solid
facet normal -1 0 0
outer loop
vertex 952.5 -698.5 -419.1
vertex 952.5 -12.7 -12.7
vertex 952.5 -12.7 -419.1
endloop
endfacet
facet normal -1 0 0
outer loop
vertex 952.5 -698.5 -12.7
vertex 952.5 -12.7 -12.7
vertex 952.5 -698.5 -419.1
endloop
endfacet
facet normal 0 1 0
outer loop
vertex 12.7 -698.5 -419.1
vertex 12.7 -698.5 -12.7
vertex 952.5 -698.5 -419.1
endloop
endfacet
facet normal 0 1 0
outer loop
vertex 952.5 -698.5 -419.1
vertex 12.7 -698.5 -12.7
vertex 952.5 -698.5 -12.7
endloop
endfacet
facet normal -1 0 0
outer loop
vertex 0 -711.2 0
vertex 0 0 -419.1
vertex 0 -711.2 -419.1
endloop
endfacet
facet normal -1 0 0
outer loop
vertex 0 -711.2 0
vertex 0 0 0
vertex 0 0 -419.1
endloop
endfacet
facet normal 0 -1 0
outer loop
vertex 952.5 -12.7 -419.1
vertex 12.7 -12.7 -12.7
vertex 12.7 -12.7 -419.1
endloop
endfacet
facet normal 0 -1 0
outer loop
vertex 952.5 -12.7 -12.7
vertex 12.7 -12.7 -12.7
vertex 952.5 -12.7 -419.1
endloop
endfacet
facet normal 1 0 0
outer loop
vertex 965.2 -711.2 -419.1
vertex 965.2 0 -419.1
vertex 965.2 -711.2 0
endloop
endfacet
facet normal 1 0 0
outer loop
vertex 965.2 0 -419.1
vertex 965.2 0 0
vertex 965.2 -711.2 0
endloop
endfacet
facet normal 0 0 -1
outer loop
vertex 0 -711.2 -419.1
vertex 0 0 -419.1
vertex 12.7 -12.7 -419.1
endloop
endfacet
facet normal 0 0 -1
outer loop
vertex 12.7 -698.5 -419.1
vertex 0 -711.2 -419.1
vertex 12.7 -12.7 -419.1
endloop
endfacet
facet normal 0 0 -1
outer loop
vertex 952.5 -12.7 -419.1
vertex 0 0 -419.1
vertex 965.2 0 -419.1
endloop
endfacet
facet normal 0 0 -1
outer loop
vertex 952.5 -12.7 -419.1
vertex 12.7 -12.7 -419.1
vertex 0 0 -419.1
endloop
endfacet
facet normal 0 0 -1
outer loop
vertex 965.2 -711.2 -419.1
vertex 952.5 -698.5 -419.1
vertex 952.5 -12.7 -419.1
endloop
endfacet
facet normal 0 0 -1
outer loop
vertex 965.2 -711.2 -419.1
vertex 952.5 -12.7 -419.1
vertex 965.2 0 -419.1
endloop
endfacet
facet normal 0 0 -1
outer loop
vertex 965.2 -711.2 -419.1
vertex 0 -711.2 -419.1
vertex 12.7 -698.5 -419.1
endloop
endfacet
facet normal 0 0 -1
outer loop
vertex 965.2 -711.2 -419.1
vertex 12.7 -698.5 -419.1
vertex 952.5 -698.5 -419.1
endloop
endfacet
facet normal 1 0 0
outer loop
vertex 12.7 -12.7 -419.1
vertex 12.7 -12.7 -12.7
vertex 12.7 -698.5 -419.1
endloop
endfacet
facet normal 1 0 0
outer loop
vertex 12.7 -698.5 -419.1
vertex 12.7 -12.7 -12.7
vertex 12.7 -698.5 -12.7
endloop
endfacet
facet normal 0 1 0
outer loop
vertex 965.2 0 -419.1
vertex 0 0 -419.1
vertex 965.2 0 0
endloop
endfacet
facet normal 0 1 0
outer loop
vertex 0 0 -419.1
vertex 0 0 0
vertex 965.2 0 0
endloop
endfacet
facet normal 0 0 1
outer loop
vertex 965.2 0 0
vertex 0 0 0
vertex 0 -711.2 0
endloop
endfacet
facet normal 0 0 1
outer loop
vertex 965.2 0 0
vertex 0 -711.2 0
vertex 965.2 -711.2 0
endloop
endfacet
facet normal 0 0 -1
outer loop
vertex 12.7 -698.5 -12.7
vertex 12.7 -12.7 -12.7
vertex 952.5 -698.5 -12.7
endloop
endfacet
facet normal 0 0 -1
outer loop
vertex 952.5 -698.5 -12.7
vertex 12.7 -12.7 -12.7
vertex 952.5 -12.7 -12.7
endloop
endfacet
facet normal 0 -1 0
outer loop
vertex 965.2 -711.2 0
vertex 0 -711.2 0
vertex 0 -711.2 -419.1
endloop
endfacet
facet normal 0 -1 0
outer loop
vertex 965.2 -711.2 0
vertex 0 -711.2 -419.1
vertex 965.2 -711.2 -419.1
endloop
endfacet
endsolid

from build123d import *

# Parameters (mm, degrees)
F0_W     = 965.2
F0_H     = 711.2
F1_DEPTH = 12.7
F2_W     = 965.2
F2_H     = 711.2
F2_W_2   = 939.8
F2_H_2   = 685.8
F3_DEPTH = 406.4


with BuildPart() as f1:
    # F0 (on Top) → F1 (new body)
    with BuildSketch(Plane.XY):
        with Locations((482.6, -355.6)):
            Rectangle(F0_W, F0_H)
    extrude(amount=-F1_DEPTH)

    # F2 (on face) → F3 (join)
    with BuildSketch(Plane(origin=(0, 0, -12.7), x_dir=(1, 0, 0), z_dir=(0, 0, -1))):
        with Locations((482.6, 355.6)):
            Rectangle(F2_W, F2_H)
        with Locations((482.6, 355.6)):
            Rectangle(F2_W_2, F2_H_2, mode=Mode.SUBTRACT)
    extrude(amount=F3_DEPTH)


solid = f1.part
